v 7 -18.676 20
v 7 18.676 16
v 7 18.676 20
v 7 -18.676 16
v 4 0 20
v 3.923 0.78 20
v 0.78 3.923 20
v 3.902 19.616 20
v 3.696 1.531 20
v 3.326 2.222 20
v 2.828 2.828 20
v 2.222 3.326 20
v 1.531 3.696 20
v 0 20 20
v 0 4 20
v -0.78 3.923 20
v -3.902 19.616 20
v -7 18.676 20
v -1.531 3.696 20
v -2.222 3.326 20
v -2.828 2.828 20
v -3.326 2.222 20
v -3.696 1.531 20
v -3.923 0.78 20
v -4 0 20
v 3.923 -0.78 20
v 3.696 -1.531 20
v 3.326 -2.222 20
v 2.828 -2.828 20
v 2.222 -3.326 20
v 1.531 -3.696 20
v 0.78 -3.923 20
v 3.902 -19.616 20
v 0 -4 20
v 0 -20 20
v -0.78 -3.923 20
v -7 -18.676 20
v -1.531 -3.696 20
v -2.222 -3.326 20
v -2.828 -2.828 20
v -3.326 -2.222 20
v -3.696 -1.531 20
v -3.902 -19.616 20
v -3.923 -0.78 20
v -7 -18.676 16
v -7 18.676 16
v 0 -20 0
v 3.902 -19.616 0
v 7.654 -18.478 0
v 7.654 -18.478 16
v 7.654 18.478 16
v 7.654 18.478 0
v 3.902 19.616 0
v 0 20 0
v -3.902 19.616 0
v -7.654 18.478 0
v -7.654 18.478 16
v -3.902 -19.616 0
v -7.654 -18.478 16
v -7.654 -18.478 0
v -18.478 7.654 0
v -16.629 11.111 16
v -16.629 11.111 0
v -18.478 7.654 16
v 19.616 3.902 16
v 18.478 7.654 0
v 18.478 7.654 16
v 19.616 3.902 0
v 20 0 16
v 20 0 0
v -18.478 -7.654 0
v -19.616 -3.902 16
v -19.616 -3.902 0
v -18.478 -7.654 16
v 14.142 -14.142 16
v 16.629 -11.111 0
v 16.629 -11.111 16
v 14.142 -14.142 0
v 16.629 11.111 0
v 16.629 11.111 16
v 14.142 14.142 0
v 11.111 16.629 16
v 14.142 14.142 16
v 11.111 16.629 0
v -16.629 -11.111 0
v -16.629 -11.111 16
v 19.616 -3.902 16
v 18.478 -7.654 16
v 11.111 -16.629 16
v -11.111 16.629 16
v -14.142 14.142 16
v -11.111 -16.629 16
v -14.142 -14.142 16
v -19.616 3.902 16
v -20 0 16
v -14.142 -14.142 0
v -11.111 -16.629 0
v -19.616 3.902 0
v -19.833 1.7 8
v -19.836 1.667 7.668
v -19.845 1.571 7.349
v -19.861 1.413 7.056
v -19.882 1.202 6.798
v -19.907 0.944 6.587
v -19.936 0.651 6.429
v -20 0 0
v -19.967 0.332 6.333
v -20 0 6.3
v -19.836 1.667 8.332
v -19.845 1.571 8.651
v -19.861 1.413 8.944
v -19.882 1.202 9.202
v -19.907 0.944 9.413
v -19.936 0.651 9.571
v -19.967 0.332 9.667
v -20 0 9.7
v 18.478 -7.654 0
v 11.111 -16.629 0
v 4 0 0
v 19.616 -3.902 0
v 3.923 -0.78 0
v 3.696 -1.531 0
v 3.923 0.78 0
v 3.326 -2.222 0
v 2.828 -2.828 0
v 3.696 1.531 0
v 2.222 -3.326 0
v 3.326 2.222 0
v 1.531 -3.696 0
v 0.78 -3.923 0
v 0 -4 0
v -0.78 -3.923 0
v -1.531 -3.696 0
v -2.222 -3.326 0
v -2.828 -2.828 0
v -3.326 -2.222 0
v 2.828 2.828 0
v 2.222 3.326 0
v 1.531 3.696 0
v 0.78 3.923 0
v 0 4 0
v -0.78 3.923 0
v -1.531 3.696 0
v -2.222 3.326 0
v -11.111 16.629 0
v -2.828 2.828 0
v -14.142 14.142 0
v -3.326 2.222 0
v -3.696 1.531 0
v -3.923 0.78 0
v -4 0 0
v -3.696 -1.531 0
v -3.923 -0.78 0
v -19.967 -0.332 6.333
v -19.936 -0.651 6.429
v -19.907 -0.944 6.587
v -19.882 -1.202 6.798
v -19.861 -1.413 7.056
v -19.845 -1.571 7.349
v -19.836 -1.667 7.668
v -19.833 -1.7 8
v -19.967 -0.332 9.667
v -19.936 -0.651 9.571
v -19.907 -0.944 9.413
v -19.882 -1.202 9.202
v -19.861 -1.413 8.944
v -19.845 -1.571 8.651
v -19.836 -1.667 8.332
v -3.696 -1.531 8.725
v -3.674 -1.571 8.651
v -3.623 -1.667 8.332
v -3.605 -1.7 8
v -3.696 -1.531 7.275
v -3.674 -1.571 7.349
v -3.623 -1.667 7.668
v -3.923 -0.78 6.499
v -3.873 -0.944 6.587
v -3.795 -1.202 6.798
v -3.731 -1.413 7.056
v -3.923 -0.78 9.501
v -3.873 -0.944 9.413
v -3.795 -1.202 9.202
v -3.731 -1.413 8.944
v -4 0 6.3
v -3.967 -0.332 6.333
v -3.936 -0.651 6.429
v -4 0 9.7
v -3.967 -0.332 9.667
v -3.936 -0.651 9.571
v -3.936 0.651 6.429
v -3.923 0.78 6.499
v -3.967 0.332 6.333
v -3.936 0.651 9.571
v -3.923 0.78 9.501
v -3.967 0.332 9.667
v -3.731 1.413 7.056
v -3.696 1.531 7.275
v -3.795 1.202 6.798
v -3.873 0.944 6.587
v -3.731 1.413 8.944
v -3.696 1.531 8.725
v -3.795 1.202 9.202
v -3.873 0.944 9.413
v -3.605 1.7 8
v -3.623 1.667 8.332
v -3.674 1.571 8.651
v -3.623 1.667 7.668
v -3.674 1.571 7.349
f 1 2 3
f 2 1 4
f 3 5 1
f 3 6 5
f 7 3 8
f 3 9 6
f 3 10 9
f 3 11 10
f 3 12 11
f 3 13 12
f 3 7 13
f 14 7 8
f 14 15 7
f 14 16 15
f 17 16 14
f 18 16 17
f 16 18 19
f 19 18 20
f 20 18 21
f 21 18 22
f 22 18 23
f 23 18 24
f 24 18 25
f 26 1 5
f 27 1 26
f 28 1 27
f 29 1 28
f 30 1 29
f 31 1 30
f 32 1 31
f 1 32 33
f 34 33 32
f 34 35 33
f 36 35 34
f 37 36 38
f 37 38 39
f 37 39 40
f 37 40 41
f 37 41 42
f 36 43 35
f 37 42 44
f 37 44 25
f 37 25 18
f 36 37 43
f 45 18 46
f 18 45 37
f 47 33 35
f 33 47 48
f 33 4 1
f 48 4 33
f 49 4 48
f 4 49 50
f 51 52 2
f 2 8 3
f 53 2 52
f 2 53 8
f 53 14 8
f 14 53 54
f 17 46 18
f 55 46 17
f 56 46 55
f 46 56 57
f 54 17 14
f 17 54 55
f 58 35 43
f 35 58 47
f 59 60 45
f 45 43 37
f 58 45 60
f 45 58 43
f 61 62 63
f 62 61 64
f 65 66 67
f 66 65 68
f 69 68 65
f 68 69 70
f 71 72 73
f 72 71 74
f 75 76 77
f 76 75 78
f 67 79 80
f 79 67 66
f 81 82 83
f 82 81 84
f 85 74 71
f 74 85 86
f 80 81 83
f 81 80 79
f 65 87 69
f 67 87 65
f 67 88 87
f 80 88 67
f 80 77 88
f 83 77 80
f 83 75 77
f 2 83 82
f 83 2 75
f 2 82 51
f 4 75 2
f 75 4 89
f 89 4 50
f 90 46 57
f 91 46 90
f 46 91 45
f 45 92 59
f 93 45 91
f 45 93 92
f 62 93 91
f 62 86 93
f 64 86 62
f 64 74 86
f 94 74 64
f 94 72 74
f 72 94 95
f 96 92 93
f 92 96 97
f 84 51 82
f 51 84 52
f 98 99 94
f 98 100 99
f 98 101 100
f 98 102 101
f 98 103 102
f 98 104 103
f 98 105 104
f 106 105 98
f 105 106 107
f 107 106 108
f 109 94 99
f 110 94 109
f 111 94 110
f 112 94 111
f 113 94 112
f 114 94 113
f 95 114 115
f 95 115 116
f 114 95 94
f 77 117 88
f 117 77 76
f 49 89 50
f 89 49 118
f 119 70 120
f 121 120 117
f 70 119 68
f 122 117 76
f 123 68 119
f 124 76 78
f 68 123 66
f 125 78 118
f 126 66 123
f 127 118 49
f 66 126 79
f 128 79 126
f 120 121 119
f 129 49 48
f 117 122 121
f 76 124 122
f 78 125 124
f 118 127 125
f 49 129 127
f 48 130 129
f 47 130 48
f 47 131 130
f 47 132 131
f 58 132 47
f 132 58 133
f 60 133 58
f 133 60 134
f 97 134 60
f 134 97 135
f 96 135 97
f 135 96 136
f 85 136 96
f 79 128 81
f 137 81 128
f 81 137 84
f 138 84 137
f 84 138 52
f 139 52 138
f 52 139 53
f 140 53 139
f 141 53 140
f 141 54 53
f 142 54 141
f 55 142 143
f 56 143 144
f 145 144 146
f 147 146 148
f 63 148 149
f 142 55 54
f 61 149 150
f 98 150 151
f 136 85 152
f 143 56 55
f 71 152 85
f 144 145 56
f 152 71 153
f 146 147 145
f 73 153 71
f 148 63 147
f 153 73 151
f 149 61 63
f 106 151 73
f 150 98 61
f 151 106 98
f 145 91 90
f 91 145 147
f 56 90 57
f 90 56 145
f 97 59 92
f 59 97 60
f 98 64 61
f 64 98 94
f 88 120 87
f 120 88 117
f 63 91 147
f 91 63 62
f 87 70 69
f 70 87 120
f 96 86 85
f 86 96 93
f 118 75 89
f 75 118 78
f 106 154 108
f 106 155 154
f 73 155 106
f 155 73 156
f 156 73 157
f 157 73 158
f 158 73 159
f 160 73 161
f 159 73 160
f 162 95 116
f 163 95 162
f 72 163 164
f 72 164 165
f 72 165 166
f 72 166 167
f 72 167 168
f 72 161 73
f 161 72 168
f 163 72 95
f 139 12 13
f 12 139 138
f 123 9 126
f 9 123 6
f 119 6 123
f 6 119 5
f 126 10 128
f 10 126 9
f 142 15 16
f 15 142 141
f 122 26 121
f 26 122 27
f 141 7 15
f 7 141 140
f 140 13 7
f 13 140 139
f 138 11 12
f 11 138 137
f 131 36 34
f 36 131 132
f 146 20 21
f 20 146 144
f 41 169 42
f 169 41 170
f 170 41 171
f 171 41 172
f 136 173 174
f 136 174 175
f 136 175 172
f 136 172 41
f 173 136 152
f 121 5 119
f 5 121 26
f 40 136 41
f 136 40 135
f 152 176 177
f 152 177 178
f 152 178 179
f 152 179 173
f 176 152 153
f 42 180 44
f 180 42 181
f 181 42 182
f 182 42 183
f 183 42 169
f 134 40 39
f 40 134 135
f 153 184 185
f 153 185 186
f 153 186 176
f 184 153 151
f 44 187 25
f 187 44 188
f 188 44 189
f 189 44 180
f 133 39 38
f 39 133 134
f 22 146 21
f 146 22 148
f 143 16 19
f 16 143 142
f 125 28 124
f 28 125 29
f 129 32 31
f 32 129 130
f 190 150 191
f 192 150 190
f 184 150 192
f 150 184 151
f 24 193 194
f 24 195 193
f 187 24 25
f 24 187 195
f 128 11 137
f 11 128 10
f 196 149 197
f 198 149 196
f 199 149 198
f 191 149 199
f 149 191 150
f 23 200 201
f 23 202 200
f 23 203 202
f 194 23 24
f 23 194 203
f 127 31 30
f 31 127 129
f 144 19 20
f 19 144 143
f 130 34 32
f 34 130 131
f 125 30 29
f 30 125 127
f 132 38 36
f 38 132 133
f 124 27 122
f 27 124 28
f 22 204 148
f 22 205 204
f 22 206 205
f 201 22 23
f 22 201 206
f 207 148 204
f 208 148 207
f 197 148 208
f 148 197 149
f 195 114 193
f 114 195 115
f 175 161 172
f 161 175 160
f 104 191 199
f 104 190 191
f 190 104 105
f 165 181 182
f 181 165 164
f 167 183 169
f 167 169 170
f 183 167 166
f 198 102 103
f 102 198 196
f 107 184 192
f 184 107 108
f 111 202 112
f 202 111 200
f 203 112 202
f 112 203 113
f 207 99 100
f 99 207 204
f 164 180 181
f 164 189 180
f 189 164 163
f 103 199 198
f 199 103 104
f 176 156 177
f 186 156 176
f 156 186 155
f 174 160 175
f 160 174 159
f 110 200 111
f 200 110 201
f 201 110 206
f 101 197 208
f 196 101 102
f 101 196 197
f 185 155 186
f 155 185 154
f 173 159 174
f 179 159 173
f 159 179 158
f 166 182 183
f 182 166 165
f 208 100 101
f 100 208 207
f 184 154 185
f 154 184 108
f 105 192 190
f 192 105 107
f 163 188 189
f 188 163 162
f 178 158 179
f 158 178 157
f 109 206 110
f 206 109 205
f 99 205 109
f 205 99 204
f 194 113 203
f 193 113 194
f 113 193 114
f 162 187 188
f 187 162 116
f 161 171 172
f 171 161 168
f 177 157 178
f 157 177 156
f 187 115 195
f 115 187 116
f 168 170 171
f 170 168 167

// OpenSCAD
$fn = 32;

// ----------------------------------------------------------------------
// Oldham coupling hub: 40 x 20 mm
// ----------------------------------------------------------------------

// --- parameters (mm) ---
flange_dia = 40;          // hub diameter
flange_len = 16;          // hub length
hub_bore = 8;             // shaft bore
key_w = 14;               // drive tongue width
tongue_h = 4;             // drive tongue height
set_d = 3.4;              // set screw tap hole

module hub() {
  cylinder(h = flange_len, d = flange_dia);
  /* tongue, clipped to the hub disc and sunk 1 mm into the face */
  intersection() {
    translate([-key_w / 2, -flange_dia / 2, flange_len - 1])
      cube([key_w, flange_dia, tongue_h + 1]);
    translate([0, 0, flange_len - 1]) cylinder(h = tongue_h + 1, d = flange_dia);
  }
}

difference() {
  hub();
  translate([0, 0, -1]) cylinder(h = flange_len + tongue_h + 2, d = hub_bore);
  translate([-flange_dia / 2 - 1, 0, flange_len * 0.5])
    rotate([0, 90, 0]) cylinder(h = flange_dia / 2 + 2, d = set_d);
}
